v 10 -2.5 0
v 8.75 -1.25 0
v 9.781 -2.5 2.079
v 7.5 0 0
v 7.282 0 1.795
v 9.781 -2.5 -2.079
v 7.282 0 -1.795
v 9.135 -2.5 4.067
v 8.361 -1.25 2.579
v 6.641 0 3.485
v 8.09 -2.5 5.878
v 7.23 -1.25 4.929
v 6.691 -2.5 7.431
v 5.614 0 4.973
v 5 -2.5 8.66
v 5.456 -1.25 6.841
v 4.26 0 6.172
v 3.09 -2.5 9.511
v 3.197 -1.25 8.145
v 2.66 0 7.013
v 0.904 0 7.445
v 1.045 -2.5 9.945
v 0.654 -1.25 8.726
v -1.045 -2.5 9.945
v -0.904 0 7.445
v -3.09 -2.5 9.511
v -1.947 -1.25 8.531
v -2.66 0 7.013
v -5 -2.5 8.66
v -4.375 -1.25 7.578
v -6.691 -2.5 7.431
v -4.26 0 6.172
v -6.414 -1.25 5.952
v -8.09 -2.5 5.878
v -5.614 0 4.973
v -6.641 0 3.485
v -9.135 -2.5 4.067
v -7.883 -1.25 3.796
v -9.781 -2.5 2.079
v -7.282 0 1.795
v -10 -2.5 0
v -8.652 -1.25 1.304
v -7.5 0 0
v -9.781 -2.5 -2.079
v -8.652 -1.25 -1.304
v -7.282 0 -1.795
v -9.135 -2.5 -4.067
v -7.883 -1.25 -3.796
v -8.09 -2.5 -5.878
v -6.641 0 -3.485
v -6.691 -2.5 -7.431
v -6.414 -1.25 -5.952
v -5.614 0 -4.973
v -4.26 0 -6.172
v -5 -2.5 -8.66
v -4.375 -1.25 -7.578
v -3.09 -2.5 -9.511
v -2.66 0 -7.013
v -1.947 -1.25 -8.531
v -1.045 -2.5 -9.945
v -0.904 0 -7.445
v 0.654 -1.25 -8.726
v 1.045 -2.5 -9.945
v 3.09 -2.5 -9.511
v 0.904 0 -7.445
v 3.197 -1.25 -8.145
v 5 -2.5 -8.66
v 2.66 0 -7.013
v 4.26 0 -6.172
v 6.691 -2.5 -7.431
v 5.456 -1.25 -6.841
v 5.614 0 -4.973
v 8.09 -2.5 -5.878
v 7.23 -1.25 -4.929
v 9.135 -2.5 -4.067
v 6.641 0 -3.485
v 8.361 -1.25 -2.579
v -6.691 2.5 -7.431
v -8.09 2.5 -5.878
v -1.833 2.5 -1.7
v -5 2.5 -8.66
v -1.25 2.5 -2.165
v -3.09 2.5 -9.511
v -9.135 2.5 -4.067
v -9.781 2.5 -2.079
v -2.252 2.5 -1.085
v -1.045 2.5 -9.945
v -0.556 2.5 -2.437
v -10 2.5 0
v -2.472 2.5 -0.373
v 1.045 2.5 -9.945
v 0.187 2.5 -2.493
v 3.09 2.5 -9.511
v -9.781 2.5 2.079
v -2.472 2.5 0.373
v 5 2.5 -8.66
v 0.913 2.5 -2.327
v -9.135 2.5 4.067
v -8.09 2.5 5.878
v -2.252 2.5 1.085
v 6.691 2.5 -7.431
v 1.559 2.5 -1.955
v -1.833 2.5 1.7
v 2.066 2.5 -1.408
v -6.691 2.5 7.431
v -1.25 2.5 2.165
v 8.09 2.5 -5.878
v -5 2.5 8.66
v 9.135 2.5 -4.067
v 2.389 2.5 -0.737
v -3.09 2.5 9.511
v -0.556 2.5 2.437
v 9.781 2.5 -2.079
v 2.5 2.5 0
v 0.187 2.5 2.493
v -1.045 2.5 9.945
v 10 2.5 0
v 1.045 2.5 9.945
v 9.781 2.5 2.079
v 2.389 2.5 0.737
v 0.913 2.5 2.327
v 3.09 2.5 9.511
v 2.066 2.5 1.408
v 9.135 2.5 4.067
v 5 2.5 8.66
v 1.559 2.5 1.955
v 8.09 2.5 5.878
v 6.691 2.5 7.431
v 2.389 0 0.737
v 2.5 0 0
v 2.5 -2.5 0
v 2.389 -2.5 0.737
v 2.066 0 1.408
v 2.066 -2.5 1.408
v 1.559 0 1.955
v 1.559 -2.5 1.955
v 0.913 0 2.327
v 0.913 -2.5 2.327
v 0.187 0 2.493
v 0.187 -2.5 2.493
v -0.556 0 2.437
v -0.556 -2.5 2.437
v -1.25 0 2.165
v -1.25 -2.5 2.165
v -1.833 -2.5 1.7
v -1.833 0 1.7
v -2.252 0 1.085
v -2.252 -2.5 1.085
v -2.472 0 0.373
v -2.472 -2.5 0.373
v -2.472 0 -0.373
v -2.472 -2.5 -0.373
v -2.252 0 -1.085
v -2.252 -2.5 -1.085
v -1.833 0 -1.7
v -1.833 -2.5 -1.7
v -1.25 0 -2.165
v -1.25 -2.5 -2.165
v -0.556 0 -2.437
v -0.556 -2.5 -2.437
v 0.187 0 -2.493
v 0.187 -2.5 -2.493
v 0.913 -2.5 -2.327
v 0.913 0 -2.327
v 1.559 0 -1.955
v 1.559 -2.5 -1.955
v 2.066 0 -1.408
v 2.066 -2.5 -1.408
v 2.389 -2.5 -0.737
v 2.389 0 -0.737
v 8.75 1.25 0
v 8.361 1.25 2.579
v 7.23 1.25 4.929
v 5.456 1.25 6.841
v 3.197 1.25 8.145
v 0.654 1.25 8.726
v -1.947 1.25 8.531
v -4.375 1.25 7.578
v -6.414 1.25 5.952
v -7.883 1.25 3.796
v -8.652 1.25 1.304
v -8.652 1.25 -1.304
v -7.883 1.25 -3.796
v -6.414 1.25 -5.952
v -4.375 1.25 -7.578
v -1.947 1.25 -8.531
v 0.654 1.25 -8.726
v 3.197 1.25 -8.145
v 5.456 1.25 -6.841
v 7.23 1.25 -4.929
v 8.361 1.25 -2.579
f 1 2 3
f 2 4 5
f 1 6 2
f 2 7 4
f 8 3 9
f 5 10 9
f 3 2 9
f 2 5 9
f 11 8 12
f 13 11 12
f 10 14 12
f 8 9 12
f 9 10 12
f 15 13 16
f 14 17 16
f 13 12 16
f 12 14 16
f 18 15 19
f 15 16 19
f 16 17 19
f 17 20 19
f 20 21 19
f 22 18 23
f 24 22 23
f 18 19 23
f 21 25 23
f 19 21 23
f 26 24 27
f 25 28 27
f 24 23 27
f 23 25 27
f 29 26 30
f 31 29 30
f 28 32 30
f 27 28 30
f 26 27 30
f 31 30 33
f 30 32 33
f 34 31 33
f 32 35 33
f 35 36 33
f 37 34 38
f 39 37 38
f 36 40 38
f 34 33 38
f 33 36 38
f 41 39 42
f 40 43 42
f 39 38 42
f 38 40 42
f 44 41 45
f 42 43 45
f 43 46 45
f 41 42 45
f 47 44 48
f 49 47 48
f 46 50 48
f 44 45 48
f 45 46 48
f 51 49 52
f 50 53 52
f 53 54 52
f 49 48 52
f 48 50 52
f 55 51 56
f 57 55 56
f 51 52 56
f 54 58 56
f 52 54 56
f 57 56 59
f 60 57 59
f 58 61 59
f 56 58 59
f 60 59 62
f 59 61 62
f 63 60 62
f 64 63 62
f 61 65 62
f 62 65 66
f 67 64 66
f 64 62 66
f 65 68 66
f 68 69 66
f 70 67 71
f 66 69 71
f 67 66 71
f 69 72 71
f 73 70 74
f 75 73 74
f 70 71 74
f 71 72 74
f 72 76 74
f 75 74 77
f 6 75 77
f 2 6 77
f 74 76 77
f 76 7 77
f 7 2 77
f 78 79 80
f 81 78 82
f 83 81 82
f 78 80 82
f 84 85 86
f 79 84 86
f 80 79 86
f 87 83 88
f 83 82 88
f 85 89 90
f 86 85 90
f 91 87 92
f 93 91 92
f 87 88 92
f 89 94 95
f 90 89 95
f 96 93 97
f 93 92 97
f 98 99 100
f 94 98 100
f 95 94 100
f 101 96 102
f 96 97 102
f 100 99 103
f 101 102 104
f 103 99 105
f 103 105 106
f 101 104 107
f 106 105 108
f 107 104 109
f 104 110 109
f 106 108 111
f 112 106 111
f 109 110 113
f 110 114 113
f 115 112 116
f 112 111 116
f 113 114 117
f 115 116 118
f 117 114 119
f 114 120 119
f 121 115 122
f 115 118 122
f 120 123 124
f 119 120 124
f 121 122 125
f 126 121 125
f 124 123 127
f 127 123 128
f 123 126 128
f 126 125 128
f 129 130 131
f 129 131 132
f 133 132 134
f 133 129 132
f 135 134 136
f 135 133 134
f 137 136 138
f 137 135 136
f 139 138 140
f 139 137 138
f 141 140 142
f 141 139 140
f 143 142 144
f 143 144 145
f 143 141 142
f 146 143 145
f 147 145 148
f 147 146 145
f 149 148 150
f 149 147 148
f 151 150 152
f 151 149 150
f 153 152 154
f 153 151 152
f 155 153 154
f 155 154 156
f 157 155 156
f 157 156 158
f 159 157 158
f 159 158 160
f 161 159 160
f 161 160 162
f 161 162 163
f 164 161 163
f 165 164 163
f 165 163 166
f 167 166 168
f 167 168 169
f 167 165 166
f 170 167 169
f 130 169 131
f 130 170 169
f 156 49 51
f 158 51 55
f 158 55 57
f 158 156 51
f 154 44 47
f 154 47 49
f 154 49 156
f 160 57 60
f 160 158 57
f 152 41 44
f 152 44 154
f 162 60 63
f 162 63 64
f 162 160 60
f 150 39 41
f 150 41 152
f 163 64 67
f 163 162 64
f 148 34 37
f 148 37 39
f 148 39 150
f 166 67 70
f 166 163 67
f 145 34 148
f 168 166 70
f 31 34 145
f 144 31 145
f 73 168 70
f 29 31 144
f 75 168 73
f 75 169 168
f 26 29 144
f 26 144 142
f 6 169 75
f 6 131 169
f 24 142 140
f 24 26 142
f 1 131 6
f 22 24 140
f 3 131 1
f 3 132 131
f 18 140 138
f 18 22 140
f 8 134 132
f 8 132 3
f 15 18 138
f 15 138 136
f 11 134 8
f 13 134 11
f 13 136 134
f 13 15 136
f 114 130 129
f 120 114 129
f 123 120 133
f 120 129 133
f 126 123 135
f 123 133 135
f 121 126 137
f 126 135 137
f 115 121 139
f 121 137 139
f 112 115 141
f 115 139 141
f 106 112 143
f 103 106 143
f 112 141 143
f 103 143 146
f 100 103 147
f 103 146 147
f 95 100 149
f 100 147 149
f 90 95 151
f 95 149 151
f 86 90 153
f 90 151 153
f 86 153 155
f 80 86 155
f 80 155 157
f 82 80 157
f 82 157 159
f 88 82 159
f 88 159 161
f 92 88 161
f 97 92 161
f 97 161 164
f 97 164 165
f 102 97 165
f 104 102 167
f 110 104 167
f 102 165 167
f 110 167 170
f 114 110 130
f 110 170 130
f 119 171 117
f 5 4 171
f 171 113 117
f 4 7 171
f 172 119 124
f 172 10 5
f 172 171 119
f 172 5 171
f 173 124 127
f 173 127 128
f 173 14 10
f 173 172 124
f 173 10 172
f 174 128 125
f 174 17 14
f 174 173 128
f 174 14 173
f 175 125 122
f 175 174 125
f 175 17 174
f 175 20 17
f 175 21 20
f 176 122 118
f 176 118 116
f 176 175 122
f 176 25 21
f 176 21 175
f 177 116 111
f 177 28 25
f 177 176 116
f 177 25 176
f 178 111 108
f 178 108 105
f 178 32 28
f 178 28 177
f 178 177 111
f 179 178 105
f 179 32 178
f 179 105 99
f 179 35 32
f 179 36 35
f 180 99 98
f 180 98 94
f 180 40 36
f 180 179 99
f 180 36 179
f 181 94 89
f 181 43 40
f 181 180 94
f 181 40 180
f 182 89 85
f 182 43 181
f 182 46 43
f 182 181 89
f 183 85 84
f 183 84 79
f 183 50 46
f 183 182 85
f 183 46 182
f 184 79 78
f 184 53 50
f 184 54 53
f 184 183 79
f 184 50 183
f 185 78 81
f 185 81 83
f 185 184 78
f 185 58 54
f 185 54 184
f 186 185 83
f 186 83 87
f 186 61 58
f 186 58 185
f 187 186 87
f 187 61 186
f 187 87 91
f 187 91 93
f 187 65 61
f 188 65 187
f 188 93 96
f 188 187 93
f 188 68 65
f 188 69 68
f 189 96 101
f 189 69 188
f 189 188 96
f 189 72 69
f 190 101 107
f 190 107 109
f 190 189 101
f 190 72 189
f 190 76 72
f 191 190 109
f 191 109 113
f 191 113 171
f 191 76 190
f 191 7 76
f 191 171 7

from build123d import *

# Parameters (mm, degrees)
F0_R     = 10
F0_R_2   = 2.5
F1_DEPTH = 2.5
F2_SIZE  = 2.49999


# Not quite as in the source:
# - a fillet or chamfer is up to 0.001 mm smaller than in the source, because OpenCascade refuses the exact size


with BuildPart() as f1:
    # F0 (on Front) → F1 (new body)
    with BuildSketch(Plane.XZ):
        Circle(F0_R)
        Circle(F0_R_2, mode=Mode.SUBTRACT)
    extrude(amount=F1_DEPTH)

    # F2 (size 2.5 in the source; OpenCascade refuses exactly that, so slightly less here)
    f2_edges = [f1.edges().sort_by_distance(p)[0] for p in [
        (-10, 0, 0),
    ]]
    chamfer(f2_edges, length=F2_SIZE)

    # F3: F1 across plane


with BuildPart() as f1_1:
    add(f1.part)
    add(f1.part.mirror(Plane.XZ))


solid = f1_1.part
